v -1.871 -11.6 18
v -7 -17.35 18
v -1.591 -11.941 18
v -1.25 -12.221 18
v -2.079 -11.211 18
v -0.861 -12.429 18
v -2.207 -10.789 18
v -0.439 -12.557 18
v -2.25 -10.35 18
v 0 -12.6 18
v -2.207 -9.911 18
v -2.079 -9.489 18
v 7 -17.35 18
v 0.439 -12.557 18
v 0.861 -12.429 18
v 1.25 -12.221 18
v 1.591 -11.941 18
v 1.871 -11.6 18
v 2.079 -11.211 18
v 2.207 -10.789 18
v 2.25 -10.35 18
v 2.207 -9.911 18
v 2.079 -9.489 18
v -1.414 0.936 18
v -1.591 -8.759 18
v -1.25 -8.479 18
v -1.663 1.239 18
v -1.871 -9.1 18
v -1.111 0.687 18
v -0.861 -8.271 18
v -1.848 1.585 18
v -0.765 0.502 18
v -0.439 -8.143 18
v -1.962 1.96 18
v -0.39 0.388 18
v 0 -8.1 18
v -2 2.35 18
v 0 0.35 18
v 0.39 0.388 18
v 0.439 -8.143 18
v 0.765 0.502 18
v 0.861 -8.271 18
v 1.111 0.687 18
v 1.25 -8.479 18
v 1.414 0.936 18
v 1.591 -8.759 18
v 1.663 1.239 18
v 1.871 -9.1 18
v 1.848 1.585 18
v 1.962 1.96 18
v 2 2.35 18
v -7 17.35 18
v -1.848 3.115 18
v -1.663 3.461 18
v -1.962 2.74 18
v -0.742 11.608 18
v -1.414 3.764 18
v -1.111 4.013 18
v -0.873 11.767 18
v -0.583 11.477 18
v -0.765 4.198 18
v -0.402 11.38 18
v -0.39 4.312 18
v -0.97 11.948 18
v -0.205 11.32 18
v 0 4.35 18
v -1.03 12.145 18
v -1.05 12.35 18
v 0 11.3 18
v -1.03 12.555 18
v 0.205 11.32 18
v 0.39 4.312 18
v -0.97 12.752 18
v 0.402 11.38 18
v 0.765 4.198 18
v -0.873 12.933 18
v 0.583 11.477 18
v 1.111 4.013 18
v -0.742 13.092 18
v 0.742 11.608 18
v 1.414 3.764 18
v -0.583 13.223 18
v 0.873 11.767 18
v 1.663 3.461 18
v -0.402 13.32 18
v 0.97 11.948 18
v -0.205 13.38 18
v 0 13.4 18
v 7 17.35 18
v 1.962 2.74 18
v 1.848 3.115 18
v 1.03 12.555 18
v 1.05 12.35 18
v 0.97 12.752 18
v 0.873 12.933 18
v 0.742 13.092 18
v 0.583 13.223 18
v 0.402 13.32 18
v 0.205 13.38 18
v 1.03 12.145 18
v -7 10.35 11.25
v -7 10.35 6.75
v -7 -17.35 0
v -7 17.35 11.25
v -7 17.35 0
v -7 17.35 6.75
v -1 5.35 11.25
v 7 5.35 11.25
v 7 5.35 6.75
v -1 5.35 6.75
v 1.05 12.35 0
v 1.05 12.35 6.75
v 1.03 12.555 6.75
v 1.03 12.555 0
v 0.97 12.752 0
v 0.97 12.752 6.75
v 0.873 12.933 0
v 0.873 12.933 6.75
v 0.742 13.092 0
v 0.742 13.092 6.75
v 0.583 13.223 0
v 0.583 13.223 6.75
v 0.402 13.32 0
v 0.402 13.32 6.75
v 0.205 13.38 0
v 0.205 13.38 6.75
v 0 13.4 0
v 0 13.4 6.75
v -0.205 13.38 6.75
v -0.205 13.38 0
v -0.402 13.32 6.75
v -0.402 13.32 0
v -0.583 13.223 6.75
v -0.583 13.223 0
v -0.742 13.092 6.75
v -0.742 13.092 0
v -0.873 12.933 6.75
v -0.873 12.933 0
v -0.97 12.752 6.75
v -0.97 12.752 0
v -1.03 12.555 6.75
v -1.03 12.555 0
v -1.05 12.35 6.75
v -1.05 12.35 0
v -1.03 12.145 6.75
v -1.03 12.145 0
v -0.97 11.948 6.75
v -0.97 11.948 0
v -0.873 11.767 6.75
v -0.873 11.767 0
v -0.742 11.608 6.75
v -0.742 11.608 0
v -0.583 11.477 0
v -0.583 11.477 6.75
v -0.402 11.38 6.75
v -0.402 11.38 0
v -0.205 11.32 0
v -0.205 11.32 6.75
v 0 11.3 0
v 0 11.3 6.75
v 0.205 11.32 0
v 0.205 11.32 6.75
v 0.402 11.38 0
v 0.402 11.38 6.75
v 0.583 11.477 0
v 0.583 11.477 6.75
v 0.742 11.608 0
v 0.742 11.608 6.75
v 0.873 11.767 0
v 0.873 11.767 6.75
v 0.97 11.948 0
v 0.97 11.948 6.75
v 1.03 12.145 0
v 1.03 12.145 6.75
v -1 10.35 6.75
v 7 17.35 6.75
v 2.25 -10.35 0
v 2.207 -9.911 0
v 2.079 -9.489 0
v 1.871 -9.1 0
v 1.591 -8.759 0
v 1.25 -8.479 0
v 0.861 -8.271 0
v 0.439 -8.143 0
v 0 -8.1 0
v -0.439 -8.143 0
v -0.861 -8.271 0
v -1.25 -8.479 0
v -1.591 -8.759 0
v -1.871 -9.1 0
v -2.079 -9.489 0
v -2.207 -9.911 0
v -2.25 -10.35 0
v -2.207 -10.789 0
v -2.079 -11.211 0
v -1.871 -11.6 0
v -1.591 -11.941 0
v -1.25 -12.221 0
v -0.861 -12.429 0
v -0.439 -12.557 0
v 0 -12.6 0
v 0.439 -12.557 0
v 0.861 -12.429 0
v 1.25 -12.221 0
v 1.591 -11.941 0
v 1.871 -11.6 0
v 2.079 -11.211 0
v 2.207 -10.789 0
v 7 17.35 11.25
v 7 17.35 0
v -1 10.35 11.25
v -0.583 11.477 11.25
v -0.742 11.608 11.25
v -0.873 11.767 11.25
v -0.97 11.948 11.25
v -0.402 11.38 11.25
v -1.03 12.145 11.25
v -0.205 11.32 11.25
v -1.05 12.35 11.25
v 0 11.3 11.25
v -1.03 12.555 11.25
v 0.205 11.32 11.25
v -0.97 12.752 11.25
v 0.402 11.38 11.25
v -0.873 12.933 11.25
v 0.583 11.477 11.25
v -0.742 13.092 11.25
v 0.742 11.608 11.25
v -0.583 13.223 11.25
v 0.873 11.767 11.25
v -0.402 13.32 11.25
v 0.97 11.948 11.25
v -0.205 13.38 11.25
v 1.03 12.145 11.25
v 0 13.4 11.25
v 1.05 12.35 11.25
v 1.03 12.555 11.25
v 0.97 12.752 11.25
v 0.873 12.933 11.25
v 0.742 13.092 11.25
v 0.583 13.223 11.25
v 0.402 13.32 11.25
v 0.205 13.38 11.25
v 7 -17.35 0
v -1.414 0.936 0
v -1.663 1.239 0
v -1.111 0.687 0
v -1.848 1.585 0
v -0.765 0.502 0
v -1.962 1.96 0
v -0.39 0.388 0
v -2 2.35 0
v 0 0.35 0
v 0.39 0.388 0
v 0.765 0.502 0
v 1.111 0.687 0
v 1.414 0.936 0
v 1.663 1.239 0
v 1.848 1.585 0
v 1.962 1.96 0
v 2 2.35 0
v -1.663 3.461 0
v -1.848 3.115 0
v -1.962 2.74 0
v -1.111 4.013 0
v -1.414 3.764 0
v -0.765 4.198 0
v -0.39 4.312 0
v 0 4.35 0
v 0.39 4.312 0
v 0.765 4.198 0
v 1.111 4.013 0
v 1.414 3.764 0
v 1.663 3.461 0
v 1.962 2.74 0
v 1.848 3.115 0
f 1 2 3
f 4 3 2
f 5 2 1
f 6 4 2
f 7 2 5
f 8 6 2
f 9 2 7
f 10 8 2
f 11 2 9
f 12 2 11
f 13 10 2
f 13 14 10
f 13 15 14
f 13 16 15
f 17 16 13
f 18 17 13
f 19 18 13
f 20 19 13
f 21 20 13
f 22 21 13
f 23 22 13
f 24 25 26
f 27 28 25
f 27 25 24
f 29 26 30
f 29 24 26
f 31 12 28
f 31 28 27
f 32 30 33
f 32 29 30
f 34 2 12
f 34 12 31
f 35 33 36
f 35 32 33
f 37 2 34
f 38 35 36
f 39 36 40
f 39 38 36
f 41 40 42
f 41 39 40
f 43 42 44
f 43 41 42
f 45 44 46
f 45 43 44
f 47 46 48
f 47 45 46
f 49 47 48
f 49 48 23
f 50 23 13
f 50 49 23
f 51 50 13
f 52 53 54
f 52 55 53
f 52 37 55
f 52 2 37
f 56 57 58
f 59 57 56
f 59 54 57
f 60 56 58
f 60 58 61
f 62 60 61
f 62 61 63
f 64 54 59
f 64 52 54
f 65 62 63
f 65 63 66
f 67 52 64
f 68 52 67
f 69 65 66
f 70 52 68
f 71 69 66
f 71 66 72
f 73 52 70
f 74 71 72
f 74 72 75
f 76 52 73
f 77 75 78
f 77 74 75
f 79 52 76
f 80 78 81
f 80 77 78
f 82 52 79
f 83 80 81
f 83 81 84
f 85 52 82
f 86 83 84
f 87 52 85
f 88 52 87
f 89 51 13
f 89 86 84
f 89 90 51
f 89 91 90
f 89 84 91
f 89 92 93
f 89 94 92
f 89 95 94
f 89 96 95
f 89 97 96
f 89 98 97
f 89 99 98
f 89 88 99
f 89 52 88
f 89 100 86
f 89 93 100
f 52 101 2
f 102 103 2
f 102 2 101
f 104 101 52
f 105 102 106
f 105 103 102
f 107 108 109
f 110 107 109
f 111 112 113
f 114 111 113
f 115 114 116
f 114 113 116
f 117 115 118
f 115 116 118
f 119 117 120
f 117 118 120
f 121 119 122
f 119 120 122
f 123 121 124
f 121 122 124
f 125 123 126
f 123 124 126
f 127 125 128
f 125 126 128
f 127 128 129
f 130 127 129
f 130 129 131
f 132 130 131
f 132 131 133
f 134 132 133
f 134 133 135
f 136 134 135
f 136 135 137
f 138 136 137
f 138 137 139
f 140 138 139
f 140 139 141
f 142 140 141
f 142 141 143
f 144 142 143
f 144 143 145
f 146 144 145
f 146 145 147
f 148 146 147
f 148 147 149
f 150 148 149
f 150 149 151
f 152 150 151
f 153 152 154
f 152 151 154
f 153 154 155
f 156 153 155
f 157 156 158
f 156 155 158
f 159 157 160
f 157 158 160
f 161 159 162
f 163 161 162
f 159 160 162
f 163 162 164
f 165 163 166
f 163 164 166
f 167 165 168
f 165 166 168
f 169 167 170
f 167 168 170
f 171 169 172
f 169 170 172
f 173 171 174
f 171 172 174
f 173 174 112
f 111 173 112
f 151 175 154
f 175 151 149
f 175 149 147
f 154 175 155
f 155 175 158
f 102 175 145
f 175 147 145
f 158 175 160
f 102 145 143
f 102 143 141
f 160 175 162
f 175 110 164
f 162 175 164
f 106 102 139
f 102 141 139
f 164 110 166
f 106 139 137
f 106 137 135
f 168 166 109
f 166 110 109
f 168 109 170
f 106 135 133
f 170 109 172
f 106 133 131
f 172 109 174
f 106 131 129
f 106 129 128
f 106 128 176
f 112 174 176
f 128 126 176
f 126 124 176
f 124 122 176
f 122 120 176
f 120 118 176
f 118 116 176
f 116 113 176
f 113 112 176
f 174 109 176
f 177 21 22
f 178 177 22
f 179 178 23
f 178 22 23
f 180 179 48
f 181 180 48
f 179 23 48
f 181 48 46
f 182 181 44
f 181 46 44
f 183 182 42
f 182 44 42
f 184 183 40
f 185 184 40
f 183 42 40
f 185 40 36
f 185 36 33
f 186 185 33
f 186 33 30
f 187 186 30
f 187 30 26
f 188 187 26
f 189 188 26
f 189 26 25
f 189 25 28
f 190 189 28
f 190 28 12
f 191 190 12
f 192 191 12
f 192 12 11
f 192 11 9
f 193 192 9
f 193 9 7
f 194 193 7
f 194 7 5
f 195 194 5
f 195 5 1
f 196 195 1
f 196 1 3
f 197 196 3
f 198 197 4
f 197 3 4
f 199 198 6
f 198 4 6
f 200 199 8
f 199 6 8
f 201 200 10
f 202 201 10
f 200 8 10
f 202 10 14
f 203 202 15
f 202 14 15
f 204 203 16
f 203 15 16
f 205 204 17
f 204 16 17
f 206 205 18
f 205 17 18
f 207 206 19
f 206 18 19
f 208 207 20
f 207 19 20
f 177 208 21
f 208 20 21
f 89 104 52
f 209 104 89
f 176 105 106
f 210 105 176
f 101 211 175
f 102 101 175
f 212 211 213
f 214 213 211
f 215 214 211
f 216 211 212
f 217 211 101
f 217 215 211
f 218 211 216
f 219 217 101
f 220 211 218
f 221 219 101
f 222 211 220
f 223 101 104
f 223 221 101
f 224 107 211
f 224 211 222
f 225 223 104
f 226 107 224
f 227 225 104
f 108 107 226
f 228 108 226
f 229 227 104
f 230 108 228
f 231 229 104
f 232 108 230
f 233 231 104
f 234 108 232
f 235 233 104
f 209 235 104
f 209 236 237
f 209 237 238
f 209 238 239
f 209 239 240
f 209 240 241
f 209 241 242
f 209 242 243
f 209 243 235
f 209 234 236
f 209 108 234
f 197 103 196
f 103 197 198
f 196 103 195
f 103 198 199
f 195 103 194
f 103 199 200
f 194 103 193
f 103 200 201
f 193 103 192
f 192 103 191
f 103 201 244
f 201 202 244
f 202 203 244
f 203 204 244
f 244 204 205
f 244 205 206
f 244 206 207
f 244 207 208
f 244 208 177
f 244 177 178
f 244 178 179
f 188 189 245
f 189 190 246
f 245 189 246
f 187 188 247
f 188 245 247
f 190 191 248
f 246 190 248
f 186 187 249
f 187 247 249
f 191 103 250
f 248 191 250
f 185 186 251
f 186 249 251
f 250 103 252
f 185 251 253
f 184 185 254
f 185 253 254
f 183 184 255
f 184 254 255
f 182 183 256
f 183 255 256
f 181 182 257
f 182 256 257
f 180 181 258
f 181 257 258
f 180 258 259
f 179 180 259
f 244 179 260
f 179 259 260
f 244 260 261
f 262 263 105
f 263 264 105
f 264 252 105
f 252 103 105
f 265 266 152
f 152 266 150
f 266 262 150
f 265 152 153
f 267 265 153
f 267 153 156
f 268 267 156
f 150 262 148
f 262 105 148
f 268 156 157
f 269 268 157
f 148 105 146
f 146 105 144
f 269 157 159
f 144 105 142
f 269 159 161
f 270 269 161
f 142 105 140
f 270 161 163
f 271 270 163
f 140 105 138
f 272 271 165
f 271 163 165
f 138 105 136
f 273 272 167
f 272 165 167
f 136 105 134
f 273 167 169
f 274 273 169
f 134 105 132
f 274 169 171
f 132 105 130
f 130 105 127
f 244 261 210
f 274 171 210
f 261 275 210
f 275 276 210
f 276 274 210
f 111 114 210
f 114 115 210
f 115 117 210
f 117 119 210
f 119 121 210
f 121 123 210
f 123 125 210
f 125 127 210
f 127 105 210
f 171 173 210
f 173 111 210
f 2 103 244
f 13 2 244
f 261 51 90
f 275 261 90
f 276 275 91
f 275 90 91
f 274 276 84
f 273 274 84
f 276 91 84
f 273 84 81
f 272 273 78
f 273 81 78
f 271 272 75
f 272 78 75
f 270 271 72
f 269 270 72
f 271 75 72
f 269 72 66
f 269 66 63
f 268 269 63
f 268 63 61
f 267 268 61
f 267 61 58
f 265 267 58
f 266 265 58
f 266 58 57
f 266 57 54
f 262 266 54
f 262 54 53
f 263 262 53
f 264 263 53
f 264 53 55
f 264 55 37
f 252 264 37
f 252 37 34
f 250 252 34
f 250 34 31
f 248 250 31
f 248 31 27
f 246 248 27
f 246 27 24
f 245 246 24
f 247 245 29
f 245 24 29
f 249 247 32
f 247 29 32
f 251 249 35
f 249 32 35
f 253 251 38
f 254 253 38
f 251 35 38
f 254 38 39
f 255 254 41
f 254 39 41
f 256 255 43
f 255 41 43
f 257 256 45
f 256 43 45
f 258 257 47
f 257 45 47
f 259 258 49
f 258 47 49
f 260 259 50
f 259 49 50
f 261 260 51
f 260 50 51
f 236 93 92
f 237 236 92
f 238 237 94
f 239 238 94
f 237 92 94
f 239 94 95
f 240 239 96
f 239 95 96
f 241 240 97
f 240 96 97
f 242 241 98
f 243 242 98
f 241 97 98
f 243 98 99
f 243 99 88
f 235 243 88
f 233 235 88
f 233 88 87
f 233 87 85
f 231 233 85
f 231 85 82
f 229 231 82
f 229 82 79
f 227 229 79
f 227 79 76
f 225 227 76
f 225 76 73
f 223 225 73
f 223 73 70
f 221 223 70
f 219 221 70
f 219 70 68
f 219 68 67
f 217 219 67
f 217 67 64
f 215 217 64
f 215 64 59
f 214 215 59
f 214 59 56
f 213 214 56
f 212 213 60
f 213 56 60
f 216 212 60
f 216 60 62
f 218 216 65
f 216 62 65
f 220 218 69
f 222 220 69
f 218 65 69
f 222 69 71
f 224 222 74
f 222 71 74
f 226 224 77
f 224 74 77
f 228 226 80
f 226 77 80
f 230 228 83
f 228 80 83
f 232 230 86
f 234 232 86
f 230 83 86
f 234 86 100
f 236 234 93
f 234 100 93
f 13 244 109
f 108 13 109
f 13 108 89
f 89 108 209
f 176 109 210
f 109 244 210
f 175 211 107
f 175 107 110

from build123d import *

# Parameters (mm, degrees)
SKETCH2_W           = 14
SKETCH2_H           = 34.7
BOSS_EXTRUDE1_DEPTH = 18
SKETCH3_R           = 2.25
SKETCH3_R_2         = 2
CUT_EXTRUDE1_DEPTH  = 26.961943302
SKETCH4_W           = 4.5
SKETCH4_H           = 12
CUT_EXTRUDE2_DEPTH  = 8
SKETCH5_R           = 1.05
CUT_EXTRUDE3_DEPTH  = 26.961943302
SKETCH8_W           = 4.5
SKETCH8_H           = 7
CUT_EXTRUDE6_DEPTH  = 29.653490189


with BuildPart() as part:
    # Sketch2 → Boss-Extrude1 (new body)
    with BuildSketch(Plane.XY):
        Rectangle(SKETCH2_W, SKETCH2_H)
    extrude(amount=BOSS_EXTRUDE1_DEPTH)

    # Sketch3 → Cut-Extrude1 (cut, through all)
    with BuildSketch(Plane.XY.offset(18)):
        with Locations((0, -10.35)):
            Circle(SKETCH3_R)
        with Locations((0, 2.35)):
            Circle(SKETCH3_R_2)
    extrude(amount=-CUT_EXTRUDE1_DEPTH, mode=Mode.SUBTRACT)

    # Sketch4 → Cut-Extrude2 (cut)
    with BuildSketch(Plane(origin=(7, 0, 0), x_dir=(0, 0, -1), z_dir=(1, 0, 0))):
        with Locations((-9, 11.35)):
            Rectangle(SKETCH4_W, SKETCH4_H)
    extrude(amount=-CUT_EXTRUDE2_DEPTH, mode=Mode.SUBTRACT)

    # Sketch5 → Cut-Extrude3 (cut, through all)
    with BuildSketch(Plane.XY.offset(18)):
        with Locations((0, 12.35)):
            Circle(SKETCH5_R)
    extrude(amount=-CUT_EXTRUDE3_DEPTH, mode=Mode.SUBTRACT)

    # Sketch8 → Cut-Extrude6 (cut, through all)
    with BuildSketch(Plane(origin=(7, 0, 0), x_dir=(0, 0, -1), z_dir=(1, 0, 0))):
        with Locations((-9, 13.85)):
            Rectangle(SKETCH8_W, SKETCH8_H)
    extrude(amount=-CUT_EXTRUDE6_DEPTH, mode=Mode.SUBTRACT)


solid = part.part
